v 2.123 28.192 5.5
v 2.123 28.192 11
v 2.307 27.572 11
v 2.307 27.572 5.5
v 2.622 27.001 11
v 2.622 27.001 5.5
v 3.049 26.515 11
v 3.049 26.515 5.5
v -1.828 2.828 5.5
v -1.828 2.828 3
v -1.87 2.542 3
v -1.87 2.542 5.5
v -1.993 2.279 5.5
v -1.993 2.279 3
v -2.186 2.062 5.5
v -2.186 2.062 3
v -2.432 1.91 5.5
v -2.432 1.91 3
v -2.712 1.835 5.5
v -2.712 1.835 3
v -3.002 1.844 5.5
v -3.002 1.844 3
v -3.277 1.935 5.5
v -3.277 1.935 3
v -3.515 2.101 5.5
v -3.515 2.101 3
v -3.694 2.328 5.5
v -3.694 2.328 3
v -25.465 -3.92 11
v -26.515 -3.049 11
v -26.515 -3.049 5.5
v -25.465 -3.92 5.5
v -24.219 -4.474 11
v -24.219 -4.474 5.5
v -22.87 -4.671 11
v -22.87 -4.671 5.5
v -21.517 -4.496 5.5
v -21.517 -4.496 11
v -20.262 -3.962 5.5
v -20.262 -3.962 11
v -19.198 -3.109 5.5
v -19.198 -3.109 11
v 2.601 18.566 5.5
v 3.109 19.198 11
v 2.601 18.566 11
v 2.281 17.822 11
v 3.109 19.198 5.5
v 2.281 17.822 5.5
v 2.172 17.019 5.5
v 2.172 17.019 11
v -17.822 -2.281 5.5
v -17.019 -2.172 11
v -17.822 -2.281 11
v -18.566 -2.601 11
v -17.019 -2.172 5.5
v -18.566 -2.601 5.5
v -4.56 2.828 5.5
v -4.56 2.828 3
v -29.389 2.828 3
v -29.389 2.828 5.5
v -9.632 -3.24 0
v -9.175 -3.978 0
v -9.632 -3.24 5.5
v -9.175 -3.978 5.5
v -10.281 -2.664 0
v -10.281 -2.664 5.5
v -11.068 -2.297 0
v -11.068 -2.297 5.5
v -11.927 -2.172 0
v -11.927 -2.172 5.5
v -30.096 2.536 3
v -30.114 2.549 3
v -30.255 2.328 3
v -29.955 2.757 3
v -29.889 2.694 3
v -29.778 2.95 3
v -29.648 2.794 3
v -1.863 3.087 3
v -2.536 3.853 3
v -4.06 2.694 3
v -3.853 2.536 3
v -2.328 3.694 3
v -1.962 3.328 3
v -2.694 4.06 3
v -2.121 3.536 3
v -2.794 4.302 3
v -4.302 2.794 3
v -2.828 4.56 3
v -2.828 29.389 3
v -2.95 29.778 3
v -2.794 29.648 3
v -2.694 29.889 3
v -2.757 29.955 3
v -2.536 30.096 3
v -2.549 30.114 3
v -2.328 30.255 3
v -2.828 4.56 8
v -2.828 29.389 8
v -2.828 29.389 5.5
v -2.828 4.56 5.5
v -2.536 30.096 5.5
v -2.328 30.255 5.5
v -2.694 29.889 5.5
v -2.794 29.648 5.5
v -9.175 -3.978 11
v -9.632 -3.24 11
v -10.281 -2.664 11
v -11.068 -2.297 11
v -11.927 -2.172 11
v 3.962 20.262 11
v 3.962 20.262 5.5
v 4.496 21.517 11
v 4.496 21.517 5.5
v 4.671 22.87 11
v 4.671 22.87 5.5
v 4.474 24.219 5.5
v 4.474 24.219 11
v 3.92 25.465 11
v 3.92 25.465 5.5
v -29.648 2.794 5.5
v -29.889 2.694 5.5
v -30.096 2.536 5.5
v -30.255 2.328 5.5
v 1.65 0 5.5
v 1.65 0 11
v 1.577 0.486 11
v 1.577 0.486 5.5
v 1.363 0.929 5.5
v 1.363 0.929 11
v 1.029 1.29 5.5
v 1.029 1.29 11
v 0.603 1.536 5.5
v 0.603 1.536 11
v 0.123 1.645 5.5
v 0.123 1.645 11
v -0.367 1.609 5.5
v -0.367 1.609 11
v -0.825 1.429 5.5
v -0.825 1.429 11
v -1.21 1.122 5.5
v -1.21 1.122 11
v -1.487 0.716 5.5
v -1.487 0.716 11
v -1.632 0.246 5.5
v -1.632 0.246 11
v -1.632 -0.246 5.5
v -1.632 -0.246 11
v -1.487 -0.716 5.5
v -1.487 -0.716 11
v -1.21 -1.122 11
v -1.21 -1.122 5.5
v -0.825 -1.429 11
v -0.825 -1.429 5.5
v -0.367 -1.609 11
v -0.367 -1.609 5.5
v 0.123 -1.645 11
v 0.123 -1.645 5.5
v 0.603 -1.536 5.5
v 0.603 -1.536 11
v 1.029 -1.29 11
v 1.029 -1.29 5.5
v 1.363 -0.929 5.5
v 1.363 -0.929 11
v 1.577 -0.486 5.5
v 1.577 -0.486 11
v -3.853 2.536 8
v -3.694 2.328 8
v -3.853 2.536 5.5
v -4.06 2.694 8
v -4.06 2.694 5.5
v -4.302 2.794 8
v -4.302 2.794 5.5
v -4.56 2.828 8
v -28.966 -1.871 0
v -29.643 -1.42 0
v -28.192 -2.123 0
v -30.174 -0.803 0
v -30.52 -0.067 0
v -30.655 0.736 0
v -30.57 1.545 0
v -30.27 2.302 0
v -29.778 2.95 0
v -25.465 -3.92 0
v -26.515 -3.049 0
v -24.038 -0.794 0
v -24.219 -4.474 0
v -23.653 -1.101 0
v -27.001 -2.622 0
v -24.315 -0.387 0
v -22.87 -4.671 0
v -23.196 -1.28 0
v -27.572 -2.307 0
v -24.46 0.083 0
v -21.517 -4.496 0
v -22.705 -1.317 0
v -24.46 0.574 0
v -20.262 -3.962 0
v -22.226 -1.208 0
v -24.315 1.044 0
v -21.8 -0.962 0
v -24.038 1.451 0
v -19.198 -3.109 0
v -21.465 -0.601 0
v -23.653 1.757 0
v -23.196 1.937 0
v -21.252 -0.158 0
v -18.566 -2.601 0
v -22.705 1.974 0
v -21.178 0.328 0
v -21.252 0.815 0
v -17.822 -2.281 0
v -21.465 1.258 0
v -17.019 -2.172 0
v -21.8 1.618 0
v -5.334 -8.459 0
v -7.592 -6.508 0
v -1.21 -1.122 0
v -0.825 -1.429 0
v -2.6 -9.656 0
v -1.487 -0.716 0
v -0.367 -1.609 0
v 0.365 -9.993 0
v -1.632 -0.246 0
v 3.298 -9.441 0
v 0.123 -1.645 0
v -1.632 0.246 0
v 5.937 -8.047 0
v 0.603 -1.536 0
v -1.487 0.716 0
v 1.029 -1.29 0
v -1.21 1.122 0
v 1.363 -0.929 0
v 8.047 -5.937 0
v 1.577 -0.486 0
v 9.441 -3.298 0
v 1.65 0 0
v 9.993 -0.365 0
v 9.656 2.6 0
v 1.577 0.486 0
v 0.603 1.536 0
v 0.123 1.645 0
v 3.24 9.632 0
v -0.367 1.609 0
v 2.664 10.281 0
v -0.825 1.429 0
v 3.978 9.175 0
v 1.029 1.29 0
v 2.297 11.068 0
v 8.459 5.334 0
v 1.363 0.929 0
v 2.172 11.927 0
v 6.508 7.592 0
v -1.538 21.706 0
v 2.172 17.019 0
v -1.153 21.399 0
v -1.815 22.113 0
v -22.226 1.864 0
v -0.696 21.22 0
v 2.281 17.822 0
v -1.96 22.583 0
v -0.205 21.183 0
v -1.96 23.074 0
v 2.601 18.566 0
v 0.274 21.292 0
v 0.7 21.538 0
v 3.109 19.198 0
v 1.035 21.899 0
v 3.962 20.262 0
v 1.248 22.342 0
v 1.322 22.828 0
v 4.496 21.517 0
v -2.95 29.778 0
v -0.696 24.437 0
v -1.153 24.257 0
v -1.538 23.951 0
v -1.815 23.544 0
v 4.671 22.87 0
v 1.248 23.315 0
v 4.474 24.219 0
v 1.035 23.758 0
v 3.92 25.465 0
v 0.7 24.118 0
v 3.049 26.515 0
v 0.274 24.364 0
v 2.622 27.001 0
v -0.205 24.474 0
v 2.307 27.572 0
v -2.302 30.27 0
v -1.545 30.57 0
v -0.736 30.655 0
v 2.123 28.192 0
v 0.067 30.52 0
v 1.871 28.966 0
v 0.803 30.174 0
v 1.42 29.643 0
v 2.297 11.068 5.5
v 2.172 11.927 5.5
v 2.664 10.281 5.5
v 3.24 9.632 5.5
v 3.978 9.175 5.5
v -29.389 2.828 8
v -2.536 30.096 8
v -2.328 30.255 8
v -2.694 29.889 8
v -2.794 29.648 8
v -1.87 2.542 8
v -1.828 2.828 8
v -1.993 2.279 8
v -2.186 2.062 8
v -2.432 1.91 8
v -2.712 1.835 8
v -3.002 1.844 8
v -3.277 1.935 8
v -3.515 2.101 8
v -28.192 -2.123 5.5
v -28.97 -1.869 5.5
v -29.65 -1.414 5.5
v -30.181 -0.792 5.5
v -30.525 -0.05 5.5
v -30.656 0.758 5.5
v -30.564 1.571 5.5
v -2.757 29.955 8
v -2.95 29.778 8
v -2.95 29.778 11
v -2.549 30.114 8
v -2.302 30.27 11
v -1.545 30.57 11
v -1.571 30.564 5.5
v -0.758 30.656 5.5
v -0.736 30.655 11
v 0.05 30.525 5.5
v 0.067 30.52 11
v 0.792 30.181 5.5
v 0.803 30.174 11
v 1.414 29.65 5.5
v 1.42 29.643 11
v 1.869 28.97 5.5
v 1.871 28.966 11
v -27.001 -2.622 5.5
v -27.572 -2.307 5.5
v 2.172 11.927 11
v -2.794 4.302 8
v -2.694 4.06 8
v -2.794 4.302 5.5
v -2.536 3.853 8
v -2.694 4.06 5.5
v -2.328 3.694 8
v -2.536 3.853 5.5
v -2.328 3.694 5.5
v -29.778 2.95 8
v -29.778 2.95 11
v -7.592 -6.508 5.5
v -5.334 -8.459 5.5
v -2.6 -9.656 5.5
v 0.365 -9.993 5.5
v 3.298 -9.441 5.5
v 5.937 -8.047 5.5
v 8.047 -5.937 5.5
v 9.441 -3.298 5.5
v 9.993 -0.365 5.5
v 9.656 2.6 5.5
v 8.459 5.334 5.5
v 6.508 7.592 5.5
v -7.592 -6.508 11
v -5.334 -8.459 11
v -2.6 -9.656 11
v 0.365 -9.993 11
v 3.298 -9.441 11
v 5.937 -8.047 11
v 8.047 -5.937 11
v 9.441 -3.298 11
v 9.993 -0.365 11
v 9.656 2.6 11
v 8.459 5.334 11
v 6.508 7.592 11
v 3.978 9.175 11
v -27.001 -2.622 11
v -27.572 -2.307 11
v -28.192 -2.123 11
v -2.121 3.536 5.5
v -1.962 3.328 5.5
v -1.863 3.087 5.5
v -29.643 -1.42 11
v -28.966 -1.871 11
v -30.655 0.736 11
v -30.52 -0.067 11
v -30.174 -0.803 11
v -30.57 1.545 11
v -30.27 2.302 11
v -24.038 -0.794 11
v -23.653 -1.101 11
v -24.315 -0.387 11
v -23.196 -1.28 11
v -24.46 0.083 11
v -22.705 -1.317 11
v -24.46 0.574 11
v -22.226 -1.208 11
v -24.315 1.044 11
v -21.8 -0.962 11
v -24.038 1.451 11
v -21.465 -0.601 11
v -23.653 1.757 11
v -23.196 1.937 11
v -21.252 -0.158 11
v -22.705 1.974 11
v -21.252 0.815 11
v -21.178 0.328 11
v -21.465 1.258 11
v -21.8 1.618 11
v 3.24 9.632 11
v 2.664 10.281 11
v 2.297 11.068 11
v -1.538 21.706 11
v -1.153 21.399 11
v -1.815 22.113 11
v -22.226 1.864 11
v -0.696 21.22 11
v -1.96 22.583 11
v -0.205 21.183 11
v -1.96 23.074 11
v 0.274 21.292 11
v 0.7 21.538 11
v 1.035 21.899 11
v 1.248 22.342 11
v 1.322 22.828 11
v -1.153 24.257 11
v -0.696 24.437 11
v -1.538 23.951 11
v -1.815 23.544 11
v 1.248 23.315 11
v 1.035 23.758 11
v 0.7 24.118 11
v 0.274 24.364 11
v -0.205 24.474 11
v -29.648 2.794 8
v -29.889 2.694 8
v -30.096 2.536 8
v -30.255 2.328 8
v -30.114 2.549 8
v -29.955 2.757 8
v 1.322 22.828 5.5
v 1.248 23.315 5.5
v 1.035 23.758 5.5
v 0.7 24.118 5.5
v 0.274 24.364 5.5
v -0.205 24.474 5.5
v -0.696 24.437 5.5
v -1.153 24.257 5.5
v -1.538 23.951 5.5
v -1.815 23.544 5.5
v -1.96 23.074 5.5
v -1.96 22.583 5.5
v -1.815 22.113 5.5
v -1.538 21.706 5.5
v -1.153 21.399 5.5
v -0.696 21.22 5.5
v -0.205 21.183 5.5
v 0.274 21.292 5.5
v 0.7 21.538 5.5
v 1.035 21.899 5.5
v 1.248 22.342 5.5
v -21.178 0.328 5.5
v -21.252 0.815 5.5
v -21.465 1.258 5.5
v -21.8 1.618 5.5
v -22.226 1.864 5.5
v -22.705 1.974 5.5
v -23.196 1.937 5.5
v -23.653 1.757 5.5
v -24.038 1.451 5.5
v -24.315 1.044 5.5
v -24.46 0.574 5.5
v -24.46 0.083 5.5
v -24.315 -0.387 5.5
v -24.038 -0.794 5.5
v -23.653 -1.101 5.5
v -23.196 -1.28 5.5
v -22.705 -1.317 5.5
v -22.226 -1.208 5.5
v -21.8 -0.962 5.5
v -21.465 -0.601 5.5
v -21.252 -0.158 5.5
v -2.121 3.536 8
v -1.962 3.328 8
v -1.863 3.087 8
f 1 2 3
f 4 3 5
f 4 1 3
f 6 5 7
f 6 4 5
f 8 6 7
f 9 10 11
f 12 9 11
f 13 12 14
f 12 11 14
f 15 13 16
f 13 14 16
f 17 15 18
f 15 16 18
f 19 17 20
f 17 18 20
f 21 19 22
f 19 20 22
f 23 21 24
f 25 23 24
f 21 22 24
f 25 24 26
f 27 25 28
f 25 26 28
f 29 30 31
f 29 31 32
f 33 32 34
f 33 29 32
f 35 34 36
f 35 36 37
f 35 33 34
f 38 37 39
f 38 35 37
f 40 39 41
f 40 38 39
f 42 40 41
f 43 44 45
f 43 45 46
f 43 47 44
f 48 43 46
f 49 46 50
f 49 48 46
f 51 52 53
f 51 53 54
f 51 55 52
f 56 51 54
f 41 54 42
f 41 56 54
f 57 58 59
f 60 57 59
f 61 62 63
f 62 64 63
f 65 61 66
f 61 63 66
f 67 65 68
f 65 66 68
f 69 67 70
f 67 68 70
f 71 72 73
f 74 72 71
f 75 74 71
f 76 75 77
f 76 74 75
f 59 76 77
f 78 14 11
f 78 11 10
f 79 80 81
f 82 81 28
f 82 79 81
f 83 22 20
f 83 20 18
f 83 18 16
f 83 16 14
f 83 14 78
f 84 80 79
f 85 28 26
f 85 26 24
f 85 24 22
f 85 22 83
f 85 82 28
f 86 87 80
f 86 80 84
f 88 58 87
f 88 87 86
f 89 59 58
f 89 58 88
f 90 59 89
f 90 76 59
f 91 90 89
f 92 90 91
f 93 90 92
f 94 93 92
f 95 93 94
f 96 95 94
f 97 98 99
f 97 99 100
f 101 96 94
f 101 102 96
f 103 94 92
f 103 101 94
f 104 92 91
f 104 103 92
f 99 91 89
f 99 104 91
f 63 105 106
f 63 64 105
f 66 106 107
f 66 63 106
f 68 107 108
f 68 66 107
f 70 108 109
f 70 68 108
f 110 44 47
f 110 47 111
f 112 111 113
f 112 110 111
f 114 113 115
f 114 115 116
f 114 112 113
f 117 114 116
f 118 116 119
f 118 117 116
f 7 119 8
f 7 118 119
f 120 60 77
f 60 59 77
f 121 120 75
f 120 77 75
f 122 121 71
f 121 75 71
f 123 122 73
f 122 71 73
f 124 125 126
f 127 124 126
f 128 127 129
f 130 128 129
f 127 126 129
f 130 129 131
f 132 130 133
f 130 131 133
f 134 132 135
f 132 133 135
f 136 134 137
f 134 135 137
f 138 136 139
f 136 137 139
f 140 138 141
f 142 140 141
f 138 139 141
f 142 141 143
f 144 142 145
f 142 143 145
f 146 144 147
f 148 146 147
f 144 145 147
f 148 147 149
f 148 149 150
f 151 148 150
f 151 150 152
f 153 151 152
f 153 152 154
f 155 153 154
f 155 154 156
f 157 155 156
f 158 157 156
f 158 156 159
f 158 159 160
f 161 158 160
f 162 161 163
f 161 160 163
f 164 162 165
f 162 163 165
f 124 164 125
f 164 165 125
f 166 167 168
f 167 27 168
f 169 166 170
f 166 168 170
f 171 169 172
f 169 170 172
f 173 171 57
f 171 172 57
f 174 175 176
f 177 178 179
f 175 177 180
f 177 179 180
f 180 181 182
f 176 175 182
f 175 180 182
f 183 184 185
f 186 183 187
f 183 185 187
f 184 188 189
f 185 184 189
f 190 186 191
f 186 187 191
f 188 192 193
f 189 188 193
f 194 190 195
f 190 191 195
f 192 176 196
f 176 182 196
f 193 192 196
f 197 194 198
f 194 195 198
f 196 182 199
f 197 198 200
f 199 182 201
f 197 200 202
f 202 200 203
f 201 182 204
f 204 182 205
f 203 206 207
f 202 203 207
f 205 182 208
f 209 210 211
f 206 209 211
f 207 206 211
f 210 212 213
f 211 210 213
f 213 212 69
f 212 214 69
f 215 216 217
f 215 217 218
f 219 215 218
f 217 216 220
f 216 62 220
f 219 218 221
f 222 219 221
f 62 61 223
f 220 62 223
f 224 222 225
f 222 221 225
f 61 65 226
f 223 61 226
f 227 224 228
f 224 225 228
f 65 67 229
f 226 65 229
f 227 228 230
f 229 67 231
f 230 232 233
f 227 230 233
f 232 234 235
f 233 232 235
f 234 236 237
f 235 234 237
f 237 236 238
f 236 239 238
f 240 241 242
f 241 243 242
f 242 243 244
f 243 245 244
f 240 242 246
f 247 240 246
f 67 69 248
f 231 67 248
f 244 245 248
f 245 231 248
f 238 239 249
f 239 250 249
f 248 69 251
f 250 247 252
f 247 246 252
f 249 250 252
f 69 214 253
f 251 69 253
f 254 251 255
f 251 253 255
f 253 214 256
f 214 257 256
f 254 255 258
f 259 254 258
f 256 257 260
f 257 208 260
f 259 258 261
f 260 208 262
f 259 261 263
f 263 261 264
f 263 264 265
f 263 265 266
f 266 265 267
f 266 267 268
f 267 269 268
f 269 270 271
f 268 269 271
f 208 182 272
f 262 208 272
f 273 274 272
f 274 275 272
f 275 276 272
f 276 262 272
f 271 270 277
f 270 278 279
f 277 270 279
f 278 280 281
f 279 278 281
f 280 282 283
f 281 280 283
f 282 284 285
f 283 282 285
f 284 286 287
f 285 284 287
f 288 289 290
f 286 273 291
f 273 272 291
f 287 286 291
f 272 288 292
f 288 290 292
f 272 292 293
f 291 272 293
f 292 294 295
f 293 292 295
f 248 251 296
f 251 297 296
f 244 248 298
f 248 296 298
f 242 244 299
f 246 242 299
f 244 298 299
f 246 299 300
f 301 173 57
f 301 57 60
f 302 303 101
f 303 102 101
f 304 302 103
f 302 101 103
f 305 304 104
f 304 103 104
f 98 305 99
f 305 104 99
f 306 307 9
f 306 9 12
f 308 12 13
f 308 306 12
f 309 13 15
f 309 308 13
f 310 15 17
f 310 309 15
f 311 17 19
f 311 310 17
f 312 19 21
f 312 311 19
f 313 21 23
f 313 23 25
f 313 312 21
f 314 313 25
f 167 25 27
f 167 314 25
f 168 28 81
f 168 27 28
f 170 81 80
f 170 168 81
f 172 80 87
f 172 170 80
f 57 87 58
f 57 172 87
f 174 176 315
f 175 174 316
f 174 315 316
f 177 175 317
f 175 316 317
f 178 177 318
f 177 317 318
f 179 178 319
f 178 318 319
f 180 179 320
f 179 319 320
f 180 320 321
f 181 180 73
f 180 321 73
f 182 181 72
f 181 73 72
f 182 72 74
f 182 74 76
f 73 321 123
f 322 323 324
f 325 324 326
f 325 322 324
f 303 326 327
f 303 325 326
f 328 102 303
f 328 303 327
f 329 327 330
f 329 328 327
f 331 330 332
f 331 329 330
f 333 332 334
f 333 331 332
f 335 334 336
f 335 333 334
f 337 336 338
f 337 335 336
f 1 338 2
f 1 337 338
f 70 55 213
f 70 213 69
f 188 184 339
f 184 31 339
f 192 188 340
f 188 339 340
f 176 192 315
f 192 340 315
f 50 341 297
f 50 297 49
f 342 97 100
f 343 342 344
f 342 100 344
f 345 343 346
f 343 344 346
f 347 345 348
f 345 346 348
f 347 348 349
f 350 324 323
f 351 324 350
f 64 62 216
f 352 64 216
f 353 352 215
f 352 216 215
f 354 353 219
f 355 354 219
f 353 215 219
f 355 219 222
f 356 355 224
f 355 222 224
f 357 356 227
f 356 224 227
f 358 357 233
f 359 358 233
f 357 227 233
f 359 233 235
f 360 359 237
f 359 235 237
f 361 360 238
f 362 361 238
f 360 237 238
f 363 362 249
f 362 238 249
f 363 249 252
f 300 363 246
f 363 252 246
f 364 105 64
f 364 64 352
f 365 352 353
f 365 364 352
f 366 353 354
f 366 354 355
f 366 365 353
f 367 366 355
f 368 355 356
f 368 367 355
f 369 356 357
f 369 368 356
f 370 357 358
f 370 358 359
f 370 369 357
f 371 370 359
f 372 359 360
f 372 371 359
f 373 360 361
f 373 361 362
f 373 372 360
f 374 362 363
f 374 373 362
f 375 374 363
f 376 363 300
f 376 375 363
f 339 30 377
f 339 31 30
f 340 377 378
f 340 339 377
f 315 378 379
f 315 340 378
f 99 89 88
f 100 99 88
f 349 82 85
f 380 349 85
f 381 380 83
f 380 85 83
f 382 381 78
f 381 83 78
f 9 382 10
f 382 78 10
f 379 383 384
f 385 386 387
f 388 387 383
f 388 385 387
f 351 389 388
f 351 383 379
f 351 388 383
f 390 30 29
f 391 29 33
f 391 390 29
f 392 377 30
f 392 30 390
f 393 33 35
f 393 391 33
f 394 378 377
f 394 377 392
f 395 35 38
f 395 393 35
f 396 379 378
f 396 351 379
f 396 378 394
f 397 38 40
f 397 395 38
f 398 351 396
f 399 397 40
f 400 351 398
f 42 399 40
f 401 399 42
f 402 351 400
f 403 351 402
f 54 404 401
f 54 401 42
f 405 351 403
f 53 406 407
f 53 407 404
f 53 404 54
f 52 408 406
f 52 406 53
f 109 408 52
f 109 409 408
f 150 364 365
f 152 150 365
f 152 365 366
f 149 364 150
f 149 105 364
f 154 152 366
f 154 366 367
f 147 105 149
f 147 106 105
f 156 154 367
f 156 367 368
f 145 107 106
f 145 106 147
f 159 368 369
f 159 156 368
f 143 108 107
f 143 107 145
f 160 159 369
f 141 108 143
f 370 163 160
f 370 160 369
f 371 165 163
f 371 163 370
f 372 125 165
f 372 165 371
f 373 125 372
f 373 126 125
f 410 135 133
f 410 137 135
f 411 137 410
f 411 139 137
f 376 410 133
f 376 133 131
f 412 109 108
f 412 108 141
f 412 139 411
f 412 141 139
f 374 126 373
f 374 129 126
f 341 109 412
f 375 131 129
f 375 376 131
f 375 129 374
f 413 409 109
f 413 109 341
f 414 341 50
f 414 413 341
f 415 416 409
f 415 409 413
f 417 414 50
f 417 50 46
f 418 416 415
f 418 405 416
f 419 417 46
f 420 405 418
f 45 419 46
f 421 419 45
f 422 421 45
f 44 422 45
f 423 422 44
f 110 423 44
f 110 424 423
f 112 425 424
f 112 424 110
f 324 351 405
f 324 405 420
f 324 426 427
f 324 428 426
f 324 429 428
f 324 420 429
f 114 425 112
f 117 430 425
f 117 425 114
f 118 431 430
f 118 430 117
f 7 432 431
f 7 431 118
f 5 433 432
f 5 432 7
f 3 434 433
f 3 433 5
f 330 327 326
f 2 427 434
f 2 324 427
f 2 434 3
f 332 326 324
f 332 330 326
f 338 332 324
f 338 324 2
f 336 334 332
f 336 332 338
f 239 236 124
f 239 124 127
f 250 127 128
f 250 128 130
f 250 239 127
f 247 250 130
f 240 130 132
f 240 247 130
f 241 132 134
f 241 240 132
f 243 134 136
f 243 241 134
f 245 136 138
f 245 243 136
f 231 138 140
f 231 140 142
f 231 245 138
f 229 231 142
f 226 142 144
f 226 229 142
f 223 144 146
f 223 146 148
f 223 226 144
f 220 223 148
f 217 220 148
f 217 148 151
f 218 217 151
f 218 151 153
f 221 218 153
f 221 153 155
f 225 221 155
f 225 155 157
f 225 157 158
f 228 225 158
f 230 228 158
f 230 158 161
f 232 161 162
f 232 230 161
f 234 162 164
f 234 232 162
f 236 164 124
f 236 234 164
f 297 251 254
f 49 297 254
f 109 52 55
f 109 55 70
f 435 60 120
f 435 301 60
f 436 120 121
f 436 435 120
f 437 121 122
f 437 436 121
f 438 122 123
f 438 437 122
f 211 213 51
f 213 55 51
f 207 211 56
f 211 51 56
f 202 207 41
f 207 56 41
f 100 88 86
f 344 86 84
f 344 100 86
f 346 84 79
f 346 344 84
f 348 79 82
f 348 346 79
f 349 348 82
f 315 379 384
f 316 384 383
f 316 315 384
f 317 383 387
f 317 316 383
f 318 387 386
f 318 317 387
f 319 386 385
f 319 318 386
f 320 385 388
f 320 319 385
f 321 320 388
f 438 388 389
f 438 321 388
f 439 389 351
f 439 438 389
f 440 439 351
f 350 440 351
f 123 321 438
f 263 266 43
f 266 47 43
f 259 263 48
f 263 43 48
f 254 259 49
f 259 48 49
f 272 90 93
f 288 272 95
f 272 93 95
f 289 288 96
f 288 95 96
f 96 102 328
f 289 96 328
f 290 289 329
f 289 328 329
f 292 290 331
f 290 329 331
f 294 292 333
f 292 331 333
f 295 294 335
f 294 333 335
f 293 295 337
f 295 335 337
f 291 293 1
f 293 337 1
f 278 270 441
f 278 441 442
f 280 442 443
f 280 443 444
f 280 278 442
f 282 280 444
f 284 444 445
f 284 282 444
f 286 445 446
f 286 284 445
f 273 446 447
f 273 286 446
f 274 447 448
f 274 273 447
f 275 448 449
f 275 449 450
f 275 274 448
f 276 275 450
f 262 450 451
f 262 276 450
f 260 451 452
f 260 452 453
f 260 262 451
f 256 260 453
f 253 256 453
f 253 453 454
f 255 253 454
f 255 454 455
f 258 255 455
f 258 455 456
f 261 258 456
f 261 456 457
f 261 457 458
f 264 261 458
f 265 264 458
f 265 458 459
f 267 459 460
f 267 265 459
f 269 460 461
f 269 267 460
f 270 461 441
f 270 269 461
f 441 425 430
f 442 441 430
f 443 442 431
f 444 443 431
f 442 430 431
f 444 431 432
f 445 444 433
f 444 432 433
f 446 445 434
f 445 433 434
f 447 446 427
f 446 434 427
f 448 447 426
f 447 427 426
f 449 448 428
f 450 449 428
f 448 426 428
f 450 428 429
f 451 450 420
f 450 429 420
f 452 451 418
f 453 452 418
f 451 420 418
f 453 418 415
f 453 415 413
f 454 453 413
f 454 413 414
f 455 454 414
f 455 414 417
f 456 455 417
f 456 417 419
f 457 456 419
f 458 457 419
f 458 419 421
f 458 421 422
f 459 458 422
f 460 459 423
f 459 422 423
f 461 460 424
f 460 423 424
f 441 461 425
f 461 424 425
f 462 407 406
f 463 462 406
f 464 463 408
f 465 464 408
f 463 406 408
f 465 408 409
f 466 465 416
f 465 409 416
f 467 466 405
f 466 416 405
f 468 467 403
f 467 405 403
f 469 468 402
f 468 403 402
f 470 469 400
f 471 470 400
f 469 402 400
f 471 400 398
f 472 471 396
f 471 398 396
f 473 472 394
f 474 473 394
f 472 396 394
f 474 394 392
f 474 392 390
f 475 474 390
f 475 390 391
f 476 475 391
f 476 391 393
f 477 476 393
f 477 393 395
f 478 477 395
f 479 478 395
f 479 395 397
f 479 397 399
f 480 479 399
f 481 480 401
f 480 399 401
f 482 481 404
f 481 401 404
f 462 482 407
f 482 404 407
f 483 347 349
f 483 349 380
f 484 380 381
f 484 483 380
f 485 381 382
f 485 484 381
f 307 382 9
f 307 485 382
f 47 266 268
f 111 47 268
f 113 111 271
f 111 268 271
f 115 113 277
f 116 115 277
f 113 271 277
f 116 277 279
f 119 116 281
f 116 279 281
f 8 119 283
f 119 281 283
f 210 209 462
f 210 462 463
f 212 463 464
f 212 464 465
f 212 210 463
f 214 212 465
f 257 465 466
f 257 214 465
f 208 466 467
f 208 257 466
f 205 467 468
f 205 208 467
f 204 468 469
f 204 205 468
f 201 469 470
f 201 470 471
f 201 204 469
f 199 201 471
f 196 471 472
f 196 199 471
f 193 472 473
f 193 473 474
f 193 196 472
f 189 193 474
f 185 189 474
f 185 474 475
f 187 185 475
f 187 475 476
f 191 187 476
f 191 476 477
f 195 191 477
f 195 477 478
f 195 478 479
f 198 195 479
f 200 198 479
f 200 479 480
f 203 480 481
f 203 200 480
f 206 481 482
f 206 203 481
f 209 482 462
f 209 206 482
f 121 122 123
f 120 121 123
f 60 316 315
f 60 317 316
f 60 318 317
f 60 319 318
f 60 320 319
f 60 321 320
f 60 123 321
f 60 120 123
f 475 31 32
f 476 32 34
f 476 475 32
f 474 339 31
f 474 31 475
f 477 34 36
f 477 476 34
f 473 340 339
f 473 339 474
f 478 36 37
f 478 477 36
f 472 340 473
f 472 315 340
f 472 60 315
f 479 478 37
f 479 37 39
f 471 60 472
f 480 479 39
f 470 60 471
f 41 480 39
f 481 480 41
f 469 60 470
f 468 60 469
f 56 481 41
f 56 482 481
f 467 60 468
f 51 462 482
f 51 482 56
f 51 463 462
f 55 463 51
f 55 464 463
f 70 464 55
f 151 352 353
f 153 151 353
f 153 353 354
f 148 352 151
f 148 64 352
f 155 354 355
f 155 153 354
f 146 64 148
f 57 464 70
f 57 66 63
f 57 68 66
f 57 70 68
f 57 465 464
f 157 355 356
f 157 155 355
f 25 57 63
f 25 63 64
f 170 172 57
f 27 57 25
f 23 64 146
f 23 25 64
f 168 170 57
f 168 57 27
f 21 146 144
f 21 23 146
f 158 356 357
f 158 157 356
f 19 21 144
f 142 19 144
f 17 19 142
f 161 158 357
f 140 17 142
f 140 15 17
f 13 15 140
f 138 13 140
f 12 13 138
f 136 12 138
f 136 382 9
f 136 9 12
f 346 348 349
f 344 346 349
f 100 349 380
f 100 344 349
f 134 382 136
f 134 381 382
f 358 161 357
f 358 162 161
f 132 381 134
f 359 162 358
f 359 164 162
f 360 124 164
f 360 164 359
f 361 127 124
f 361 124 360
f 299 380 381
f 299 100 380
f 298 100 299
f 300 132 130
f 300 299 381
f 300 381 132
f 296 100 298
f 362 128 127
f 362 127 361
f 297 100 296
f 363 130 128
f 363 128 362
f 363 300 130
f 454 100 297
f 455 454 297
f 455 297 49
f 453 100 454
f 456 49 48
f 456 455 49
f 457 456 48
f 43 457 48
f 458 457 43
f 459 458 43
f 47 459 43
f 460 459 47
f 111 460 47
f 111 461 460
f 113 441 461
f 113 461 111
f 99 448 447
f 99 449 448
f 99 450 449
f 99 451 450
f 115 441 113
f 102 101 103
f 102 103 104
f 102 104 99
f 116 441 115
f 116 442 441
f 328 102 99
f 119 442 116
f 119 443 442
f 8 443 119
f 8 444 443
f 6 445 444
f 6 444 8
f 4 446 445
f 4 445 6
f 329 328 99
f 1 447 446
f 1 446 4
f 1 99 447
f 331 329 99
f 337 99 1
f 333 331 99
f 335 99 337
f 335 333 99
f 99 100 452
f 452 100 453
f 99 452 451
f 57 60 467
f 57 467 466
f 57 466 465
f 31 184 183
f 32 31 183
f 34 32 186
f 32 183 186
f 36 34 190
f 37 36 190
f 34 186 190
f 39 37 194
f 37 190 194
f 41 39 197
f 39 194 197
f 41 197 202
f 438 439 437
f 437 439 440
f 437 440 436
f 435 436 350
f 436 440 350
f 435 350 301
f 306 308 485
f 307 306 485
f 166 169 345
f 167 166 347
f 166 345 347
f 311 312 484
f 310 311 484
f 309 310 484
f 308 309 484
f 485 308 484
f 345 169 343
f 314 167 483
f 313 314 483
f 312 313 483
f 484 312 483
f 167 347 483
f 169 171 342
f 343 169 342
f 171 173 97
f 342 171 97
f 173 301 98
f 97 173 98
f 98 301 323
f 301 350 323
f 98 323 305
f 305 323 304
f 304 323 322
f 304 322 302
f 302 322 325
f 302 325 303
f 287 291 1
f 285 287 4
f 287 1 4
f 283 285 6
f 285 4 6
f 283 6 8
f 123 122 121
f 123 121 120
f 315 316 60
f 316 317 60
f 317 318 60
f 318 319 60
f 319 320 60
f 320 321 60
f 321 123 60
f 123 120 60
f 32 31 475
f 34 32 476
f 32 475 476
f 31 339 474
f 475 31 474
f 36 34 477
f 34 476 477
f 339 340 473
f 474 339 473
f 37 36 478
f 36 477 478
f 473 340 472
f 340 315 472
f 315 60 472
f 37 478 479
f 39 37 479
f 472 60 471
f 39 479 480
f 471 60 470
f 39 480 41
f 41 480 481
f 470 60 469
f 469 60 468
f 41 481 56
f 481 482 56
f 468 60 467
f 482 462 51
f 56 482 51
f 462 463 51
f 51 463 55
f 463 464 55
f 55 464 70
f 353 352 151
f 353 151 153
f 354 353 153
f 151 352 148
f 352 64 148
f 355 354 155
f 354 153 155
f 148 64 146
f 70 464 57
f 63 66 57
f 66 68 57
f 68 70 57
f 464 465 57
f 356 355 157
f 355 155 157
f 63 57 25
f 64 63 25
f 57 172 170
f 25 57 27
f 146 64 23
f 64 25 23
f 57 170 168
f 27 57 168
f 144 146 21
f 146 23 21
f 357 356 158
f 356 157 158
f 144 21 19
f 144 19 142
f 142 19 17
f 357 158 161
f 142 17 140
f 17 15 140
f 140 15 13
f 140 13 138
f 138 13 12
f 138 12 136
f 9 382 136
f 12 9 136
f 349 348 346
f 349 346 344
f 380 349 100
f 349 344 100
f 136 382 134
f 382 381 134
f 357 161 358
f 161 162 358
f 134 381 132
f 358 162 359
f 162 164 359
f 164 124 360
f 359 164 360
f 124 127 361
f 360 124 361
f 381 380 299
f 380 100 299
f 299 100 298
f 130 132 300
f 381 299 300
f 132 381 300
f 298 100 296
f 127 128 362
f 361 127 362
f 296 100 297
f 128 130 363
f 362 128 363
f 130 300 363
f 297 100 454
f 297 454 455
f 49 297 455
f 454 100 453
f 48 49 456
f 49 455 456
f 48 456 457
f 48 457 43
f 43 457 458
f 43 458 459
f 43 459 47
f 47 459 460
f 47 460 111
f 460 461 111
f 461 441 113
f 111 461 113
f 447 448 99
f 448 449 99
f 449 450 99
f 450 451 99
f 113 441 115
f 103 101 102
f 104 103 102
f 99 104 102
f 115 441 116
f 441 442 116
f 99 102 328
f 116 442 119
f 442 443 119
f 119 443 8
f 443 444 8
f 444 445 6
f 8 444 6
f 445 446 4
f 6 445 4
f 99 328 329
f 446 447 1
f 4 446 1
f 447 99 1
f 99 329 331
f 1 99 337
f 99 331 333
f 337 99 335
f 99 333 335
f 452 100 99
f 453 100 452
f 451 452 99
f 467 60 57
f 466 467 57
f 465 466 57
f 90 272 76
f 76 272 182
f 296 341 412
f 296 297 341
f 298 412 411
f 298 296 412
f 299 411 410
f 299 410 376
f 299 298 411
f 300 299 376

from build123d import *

# Parameters (mm, degrees)
F1_DEPTH = 3
F0_R     = 1.65
F2_DEPTH = 5.5
F3_R     = 3
F4_R     = 3
F5_R     = 1


# Not quite as in the source:
# - a feature names something its author has since deleted; it is built from what else it names


with BuildPart() as f1:
    # F0 (on Top) → F1 (new body)
    with BuildSketch(Plane.XY):
        with BuildLine():
            ThreePointArc((-9.5916630466, 2.8284271247), (-7.0710678119, 7.0710678119), (-2.8284271247, 9.5916630466))
            Line((-2.8284271247, 9.5916630466), (-2.8284271247, 22.8284271247))
            Line((-2.8284271247, 22.8284271247), (-22.8284271247, 2.8284271247))
            Line((-22.8284271247, 2.8284271247), (-9.5916630466, 2.8284271247))
        make_face()
        with BuildLine():
            Line((-2.8284271247, 3.8284271247), (-2.8284271247, 9.5916630466))
            ThreePointArc((-2.8284271247, 9.5916630466), (-7.0710678119, 7.0710678119), (-9.5916630466, 2.8284271247))
            Line((-9.5916630466, 2.8284271247), (-3.8284271247, 2.8284271247))
            ThreePointArc((-3.8284271247, 2.8284271247), (-3.5355339059, 3.5355339059), (-2.8284271247, 3.8284271247))
        make_face()
        Polygon((-22.8284271247, 2.8284271247), (-2.8284271247, 22.8284271247), (-2.8284271247, 29.8994949366), (-29.8994949366, 2.8284271247), align=None)
        with BuildLine():
            ThreePointArc((-1.8284271247, 2.8284271247), (-2.1213203436, 3.5355339059), (-2.8284271247, 3.8284271247))
            Line((-2.8284271247, 3.8284271247), (-2.8284271247, 2.8284271247))
            Line((-2.8284271247, 2.8284271247), (-3.8284271247, 2.8284271247))
            ThreePointArc((-3.8284271247, 2.8284271247), (-2.8284271247, 1.8284271247), (-1.8284271247, 2.8284271247))
        make_face()
        with BuildLine():
            Line((-2.8284271247, 2.8284271247), (-2.8284271247, 3.8284271247))
            ThreePointArc((-2.8284271247, 3.8284271247), (-3.5355339059, 3.5355339059), (-3.8284271247, 2.8284271247))
            Line((-3.8284271247, 2.8284271247), (-2.8284271247, 2.8284271247))
        make_face()
    extrude(amount=F1_DEPTH)

    # F0 (on Top) → F2 (join)
    with BuildSketch(Plane.XY):
        with BuildLine():
            ThreePointArc((-9.7613662593, -2.1715728753), (1.0923226189, -9.9401625387), (10, 0))
            ThreePointArc((10, 0), (7.8011450683, 6.2563676062), (2.1715728753, 9.7613662593))
            ThreePointArc((2.1715728753, 9.7613662593), (-0.3392111015, 9.9942451355), (-2.8284271247, 9.5916630466))
            Line((-2.8284271247, 9.5916630466), (-2.8284271247, 3.8284271247))
            ThreePointArc((-2.8284271247, 3.8284271247), (-2.1213203436, 3.5355339059), (-1.8284271247, 2.8284271247))
            ThreePointArc((-1.8284271247, 2.8284271247), (-2.8284271247, 1.8284271247), (-3.8284271247, 2.8284271247))
            Line((-3.8284271247, 2.8284271247), (-9.5916630466, 2.8284271247))
            ThreePointArc((-9.5916630466, 2.8284271247), (-9.9942451355, 0.3392111015), (-9.7613662593, -2.1715728753))
        make_face()
        Circle(F0_R, mode=Mode.SUBTRACT)
        with BuildLine():
            ThreePointArc((-2.8284271247, 9.5916630466), (-0.3392111015, 9.9942451355), (2.1715728753, 9.7613662593))
            Line((2.1715728753, 9.7613662593), (2.1715728753, 18.4983001058))
            Line((2.1715728753, 18.4983001058), (2.1715728753, 27.1585541437))
            Line((2.1715728753, 27.1585541437), (2.1715728753, 34.8994949366))
            Line((2.1715728753, 34.8994949366), (-2.8284271247, 29.8994949366))
            Line((-2.8284271247, 29.8994949366), (-2.8284271247, 22.8284271247))
            Line((-2.8284271247, 22.8284271247), (-2.8284271247, 9.5916630466))
        make_face()
        with Locations((-0.3284271247, 22.8284271247)):
            Circle(F0_R, mode=Mode.SUBTRACT)
        with BuildLine():
            Line((-18.4983001058, -2.1715728753), (-9.7613662593, -2.1715728753))
            ThreePointArc((-9.7613662593, -2.1715728753), (-9.9942451355, 0.3392111015), (-9.5916630466, 2.8284271247))
            Line((-9.5916630466, 2.8284271247), (-22.8284271247, 2.8284271247))
            Line((-22.8284271247, 2.8284271247), (-29.8994949366, 2.8284271247))
            Line((-29.8994949366, 2.8284271247), (-34.8994949366, -2.1715728753))
            Line((-34.8994949366, -2.1715728753), (-27.1585541437, -2.1715728753))
            Line((-27.1585541437, -2.1715728753), (-18.4983001058, -2.1715728753))
        make_face()
        with Locations((-22.8284271247, 0.3284271247)):
            Circle(F0_R, mode=Mode.SUBTRACT)
        with BuildLine():
            ThreePointArc((-27.1585541437, -2.1715728753), (-22.8284271247, -4.6715728753), (-18.4983001058, -2.1715728753))
            Line((-18.4983001058, -2.1715728753), (-27.1585541437, -2.1715728753))
        make_face()
        with BuildLine():
            Line((2.1715728753, 27.1585541437), (2.1715728753, 18.4983001058))
            ThreePointArc((2.1715728753, 18.4983001058), (4.6715728753, 22.8284271247), (2.1715728753, 27.1585541437))
        make_face()
    extrude(amount=F2_DEPTH)

    # F3
    f3_edges = [f1.edges().sort_by_distance(p)[0] for p in [
        (2.171573, 34.899495, 2.75),
        (-34.899495, -2.171573, 2.75),
    ]]
    fillet(f3_edges, radius=F3_R)

    # F4
    f4_edges = [f1.edges().sort_by_distance(p)[0] for p in [
        (-9.761366, -2.171573, 2.75),
        (2.171573, 9.761366, 2.75),
        (-27.158554, -2.171573, 2.75),
        (2.171573, 27.158554, 2.75),
        (-18.4983, -2.171573, 2.75),
        (2.171573, 18.4983, 2.75),
    ]]
    fillet(f4_edges, radius=F4_R)

    # F5
    f5_edges = [f1.edges().sort_by_distance(p)[0] for p in [
        (-2.828427, 29.892922, 4.25),
        (-29.892922, 2.828427, 4.25),
        (-2.828427, 3.828427, 4.25),
        (-3.828427, 2.828427, 4.25),
    ]]
    fillet(f5_edges, radius=F5_R)


with BuildPart() as f6_1:
    # F6: instance of F1
    add(f1.part.mirror(Plane(origin=(-4.0944807871, 4.0944807939, 5.5), x_dir=(1, 0, 0), z_dir=(0, 0, 1))))


solid = Compound([f1.part, f6_1.part])
